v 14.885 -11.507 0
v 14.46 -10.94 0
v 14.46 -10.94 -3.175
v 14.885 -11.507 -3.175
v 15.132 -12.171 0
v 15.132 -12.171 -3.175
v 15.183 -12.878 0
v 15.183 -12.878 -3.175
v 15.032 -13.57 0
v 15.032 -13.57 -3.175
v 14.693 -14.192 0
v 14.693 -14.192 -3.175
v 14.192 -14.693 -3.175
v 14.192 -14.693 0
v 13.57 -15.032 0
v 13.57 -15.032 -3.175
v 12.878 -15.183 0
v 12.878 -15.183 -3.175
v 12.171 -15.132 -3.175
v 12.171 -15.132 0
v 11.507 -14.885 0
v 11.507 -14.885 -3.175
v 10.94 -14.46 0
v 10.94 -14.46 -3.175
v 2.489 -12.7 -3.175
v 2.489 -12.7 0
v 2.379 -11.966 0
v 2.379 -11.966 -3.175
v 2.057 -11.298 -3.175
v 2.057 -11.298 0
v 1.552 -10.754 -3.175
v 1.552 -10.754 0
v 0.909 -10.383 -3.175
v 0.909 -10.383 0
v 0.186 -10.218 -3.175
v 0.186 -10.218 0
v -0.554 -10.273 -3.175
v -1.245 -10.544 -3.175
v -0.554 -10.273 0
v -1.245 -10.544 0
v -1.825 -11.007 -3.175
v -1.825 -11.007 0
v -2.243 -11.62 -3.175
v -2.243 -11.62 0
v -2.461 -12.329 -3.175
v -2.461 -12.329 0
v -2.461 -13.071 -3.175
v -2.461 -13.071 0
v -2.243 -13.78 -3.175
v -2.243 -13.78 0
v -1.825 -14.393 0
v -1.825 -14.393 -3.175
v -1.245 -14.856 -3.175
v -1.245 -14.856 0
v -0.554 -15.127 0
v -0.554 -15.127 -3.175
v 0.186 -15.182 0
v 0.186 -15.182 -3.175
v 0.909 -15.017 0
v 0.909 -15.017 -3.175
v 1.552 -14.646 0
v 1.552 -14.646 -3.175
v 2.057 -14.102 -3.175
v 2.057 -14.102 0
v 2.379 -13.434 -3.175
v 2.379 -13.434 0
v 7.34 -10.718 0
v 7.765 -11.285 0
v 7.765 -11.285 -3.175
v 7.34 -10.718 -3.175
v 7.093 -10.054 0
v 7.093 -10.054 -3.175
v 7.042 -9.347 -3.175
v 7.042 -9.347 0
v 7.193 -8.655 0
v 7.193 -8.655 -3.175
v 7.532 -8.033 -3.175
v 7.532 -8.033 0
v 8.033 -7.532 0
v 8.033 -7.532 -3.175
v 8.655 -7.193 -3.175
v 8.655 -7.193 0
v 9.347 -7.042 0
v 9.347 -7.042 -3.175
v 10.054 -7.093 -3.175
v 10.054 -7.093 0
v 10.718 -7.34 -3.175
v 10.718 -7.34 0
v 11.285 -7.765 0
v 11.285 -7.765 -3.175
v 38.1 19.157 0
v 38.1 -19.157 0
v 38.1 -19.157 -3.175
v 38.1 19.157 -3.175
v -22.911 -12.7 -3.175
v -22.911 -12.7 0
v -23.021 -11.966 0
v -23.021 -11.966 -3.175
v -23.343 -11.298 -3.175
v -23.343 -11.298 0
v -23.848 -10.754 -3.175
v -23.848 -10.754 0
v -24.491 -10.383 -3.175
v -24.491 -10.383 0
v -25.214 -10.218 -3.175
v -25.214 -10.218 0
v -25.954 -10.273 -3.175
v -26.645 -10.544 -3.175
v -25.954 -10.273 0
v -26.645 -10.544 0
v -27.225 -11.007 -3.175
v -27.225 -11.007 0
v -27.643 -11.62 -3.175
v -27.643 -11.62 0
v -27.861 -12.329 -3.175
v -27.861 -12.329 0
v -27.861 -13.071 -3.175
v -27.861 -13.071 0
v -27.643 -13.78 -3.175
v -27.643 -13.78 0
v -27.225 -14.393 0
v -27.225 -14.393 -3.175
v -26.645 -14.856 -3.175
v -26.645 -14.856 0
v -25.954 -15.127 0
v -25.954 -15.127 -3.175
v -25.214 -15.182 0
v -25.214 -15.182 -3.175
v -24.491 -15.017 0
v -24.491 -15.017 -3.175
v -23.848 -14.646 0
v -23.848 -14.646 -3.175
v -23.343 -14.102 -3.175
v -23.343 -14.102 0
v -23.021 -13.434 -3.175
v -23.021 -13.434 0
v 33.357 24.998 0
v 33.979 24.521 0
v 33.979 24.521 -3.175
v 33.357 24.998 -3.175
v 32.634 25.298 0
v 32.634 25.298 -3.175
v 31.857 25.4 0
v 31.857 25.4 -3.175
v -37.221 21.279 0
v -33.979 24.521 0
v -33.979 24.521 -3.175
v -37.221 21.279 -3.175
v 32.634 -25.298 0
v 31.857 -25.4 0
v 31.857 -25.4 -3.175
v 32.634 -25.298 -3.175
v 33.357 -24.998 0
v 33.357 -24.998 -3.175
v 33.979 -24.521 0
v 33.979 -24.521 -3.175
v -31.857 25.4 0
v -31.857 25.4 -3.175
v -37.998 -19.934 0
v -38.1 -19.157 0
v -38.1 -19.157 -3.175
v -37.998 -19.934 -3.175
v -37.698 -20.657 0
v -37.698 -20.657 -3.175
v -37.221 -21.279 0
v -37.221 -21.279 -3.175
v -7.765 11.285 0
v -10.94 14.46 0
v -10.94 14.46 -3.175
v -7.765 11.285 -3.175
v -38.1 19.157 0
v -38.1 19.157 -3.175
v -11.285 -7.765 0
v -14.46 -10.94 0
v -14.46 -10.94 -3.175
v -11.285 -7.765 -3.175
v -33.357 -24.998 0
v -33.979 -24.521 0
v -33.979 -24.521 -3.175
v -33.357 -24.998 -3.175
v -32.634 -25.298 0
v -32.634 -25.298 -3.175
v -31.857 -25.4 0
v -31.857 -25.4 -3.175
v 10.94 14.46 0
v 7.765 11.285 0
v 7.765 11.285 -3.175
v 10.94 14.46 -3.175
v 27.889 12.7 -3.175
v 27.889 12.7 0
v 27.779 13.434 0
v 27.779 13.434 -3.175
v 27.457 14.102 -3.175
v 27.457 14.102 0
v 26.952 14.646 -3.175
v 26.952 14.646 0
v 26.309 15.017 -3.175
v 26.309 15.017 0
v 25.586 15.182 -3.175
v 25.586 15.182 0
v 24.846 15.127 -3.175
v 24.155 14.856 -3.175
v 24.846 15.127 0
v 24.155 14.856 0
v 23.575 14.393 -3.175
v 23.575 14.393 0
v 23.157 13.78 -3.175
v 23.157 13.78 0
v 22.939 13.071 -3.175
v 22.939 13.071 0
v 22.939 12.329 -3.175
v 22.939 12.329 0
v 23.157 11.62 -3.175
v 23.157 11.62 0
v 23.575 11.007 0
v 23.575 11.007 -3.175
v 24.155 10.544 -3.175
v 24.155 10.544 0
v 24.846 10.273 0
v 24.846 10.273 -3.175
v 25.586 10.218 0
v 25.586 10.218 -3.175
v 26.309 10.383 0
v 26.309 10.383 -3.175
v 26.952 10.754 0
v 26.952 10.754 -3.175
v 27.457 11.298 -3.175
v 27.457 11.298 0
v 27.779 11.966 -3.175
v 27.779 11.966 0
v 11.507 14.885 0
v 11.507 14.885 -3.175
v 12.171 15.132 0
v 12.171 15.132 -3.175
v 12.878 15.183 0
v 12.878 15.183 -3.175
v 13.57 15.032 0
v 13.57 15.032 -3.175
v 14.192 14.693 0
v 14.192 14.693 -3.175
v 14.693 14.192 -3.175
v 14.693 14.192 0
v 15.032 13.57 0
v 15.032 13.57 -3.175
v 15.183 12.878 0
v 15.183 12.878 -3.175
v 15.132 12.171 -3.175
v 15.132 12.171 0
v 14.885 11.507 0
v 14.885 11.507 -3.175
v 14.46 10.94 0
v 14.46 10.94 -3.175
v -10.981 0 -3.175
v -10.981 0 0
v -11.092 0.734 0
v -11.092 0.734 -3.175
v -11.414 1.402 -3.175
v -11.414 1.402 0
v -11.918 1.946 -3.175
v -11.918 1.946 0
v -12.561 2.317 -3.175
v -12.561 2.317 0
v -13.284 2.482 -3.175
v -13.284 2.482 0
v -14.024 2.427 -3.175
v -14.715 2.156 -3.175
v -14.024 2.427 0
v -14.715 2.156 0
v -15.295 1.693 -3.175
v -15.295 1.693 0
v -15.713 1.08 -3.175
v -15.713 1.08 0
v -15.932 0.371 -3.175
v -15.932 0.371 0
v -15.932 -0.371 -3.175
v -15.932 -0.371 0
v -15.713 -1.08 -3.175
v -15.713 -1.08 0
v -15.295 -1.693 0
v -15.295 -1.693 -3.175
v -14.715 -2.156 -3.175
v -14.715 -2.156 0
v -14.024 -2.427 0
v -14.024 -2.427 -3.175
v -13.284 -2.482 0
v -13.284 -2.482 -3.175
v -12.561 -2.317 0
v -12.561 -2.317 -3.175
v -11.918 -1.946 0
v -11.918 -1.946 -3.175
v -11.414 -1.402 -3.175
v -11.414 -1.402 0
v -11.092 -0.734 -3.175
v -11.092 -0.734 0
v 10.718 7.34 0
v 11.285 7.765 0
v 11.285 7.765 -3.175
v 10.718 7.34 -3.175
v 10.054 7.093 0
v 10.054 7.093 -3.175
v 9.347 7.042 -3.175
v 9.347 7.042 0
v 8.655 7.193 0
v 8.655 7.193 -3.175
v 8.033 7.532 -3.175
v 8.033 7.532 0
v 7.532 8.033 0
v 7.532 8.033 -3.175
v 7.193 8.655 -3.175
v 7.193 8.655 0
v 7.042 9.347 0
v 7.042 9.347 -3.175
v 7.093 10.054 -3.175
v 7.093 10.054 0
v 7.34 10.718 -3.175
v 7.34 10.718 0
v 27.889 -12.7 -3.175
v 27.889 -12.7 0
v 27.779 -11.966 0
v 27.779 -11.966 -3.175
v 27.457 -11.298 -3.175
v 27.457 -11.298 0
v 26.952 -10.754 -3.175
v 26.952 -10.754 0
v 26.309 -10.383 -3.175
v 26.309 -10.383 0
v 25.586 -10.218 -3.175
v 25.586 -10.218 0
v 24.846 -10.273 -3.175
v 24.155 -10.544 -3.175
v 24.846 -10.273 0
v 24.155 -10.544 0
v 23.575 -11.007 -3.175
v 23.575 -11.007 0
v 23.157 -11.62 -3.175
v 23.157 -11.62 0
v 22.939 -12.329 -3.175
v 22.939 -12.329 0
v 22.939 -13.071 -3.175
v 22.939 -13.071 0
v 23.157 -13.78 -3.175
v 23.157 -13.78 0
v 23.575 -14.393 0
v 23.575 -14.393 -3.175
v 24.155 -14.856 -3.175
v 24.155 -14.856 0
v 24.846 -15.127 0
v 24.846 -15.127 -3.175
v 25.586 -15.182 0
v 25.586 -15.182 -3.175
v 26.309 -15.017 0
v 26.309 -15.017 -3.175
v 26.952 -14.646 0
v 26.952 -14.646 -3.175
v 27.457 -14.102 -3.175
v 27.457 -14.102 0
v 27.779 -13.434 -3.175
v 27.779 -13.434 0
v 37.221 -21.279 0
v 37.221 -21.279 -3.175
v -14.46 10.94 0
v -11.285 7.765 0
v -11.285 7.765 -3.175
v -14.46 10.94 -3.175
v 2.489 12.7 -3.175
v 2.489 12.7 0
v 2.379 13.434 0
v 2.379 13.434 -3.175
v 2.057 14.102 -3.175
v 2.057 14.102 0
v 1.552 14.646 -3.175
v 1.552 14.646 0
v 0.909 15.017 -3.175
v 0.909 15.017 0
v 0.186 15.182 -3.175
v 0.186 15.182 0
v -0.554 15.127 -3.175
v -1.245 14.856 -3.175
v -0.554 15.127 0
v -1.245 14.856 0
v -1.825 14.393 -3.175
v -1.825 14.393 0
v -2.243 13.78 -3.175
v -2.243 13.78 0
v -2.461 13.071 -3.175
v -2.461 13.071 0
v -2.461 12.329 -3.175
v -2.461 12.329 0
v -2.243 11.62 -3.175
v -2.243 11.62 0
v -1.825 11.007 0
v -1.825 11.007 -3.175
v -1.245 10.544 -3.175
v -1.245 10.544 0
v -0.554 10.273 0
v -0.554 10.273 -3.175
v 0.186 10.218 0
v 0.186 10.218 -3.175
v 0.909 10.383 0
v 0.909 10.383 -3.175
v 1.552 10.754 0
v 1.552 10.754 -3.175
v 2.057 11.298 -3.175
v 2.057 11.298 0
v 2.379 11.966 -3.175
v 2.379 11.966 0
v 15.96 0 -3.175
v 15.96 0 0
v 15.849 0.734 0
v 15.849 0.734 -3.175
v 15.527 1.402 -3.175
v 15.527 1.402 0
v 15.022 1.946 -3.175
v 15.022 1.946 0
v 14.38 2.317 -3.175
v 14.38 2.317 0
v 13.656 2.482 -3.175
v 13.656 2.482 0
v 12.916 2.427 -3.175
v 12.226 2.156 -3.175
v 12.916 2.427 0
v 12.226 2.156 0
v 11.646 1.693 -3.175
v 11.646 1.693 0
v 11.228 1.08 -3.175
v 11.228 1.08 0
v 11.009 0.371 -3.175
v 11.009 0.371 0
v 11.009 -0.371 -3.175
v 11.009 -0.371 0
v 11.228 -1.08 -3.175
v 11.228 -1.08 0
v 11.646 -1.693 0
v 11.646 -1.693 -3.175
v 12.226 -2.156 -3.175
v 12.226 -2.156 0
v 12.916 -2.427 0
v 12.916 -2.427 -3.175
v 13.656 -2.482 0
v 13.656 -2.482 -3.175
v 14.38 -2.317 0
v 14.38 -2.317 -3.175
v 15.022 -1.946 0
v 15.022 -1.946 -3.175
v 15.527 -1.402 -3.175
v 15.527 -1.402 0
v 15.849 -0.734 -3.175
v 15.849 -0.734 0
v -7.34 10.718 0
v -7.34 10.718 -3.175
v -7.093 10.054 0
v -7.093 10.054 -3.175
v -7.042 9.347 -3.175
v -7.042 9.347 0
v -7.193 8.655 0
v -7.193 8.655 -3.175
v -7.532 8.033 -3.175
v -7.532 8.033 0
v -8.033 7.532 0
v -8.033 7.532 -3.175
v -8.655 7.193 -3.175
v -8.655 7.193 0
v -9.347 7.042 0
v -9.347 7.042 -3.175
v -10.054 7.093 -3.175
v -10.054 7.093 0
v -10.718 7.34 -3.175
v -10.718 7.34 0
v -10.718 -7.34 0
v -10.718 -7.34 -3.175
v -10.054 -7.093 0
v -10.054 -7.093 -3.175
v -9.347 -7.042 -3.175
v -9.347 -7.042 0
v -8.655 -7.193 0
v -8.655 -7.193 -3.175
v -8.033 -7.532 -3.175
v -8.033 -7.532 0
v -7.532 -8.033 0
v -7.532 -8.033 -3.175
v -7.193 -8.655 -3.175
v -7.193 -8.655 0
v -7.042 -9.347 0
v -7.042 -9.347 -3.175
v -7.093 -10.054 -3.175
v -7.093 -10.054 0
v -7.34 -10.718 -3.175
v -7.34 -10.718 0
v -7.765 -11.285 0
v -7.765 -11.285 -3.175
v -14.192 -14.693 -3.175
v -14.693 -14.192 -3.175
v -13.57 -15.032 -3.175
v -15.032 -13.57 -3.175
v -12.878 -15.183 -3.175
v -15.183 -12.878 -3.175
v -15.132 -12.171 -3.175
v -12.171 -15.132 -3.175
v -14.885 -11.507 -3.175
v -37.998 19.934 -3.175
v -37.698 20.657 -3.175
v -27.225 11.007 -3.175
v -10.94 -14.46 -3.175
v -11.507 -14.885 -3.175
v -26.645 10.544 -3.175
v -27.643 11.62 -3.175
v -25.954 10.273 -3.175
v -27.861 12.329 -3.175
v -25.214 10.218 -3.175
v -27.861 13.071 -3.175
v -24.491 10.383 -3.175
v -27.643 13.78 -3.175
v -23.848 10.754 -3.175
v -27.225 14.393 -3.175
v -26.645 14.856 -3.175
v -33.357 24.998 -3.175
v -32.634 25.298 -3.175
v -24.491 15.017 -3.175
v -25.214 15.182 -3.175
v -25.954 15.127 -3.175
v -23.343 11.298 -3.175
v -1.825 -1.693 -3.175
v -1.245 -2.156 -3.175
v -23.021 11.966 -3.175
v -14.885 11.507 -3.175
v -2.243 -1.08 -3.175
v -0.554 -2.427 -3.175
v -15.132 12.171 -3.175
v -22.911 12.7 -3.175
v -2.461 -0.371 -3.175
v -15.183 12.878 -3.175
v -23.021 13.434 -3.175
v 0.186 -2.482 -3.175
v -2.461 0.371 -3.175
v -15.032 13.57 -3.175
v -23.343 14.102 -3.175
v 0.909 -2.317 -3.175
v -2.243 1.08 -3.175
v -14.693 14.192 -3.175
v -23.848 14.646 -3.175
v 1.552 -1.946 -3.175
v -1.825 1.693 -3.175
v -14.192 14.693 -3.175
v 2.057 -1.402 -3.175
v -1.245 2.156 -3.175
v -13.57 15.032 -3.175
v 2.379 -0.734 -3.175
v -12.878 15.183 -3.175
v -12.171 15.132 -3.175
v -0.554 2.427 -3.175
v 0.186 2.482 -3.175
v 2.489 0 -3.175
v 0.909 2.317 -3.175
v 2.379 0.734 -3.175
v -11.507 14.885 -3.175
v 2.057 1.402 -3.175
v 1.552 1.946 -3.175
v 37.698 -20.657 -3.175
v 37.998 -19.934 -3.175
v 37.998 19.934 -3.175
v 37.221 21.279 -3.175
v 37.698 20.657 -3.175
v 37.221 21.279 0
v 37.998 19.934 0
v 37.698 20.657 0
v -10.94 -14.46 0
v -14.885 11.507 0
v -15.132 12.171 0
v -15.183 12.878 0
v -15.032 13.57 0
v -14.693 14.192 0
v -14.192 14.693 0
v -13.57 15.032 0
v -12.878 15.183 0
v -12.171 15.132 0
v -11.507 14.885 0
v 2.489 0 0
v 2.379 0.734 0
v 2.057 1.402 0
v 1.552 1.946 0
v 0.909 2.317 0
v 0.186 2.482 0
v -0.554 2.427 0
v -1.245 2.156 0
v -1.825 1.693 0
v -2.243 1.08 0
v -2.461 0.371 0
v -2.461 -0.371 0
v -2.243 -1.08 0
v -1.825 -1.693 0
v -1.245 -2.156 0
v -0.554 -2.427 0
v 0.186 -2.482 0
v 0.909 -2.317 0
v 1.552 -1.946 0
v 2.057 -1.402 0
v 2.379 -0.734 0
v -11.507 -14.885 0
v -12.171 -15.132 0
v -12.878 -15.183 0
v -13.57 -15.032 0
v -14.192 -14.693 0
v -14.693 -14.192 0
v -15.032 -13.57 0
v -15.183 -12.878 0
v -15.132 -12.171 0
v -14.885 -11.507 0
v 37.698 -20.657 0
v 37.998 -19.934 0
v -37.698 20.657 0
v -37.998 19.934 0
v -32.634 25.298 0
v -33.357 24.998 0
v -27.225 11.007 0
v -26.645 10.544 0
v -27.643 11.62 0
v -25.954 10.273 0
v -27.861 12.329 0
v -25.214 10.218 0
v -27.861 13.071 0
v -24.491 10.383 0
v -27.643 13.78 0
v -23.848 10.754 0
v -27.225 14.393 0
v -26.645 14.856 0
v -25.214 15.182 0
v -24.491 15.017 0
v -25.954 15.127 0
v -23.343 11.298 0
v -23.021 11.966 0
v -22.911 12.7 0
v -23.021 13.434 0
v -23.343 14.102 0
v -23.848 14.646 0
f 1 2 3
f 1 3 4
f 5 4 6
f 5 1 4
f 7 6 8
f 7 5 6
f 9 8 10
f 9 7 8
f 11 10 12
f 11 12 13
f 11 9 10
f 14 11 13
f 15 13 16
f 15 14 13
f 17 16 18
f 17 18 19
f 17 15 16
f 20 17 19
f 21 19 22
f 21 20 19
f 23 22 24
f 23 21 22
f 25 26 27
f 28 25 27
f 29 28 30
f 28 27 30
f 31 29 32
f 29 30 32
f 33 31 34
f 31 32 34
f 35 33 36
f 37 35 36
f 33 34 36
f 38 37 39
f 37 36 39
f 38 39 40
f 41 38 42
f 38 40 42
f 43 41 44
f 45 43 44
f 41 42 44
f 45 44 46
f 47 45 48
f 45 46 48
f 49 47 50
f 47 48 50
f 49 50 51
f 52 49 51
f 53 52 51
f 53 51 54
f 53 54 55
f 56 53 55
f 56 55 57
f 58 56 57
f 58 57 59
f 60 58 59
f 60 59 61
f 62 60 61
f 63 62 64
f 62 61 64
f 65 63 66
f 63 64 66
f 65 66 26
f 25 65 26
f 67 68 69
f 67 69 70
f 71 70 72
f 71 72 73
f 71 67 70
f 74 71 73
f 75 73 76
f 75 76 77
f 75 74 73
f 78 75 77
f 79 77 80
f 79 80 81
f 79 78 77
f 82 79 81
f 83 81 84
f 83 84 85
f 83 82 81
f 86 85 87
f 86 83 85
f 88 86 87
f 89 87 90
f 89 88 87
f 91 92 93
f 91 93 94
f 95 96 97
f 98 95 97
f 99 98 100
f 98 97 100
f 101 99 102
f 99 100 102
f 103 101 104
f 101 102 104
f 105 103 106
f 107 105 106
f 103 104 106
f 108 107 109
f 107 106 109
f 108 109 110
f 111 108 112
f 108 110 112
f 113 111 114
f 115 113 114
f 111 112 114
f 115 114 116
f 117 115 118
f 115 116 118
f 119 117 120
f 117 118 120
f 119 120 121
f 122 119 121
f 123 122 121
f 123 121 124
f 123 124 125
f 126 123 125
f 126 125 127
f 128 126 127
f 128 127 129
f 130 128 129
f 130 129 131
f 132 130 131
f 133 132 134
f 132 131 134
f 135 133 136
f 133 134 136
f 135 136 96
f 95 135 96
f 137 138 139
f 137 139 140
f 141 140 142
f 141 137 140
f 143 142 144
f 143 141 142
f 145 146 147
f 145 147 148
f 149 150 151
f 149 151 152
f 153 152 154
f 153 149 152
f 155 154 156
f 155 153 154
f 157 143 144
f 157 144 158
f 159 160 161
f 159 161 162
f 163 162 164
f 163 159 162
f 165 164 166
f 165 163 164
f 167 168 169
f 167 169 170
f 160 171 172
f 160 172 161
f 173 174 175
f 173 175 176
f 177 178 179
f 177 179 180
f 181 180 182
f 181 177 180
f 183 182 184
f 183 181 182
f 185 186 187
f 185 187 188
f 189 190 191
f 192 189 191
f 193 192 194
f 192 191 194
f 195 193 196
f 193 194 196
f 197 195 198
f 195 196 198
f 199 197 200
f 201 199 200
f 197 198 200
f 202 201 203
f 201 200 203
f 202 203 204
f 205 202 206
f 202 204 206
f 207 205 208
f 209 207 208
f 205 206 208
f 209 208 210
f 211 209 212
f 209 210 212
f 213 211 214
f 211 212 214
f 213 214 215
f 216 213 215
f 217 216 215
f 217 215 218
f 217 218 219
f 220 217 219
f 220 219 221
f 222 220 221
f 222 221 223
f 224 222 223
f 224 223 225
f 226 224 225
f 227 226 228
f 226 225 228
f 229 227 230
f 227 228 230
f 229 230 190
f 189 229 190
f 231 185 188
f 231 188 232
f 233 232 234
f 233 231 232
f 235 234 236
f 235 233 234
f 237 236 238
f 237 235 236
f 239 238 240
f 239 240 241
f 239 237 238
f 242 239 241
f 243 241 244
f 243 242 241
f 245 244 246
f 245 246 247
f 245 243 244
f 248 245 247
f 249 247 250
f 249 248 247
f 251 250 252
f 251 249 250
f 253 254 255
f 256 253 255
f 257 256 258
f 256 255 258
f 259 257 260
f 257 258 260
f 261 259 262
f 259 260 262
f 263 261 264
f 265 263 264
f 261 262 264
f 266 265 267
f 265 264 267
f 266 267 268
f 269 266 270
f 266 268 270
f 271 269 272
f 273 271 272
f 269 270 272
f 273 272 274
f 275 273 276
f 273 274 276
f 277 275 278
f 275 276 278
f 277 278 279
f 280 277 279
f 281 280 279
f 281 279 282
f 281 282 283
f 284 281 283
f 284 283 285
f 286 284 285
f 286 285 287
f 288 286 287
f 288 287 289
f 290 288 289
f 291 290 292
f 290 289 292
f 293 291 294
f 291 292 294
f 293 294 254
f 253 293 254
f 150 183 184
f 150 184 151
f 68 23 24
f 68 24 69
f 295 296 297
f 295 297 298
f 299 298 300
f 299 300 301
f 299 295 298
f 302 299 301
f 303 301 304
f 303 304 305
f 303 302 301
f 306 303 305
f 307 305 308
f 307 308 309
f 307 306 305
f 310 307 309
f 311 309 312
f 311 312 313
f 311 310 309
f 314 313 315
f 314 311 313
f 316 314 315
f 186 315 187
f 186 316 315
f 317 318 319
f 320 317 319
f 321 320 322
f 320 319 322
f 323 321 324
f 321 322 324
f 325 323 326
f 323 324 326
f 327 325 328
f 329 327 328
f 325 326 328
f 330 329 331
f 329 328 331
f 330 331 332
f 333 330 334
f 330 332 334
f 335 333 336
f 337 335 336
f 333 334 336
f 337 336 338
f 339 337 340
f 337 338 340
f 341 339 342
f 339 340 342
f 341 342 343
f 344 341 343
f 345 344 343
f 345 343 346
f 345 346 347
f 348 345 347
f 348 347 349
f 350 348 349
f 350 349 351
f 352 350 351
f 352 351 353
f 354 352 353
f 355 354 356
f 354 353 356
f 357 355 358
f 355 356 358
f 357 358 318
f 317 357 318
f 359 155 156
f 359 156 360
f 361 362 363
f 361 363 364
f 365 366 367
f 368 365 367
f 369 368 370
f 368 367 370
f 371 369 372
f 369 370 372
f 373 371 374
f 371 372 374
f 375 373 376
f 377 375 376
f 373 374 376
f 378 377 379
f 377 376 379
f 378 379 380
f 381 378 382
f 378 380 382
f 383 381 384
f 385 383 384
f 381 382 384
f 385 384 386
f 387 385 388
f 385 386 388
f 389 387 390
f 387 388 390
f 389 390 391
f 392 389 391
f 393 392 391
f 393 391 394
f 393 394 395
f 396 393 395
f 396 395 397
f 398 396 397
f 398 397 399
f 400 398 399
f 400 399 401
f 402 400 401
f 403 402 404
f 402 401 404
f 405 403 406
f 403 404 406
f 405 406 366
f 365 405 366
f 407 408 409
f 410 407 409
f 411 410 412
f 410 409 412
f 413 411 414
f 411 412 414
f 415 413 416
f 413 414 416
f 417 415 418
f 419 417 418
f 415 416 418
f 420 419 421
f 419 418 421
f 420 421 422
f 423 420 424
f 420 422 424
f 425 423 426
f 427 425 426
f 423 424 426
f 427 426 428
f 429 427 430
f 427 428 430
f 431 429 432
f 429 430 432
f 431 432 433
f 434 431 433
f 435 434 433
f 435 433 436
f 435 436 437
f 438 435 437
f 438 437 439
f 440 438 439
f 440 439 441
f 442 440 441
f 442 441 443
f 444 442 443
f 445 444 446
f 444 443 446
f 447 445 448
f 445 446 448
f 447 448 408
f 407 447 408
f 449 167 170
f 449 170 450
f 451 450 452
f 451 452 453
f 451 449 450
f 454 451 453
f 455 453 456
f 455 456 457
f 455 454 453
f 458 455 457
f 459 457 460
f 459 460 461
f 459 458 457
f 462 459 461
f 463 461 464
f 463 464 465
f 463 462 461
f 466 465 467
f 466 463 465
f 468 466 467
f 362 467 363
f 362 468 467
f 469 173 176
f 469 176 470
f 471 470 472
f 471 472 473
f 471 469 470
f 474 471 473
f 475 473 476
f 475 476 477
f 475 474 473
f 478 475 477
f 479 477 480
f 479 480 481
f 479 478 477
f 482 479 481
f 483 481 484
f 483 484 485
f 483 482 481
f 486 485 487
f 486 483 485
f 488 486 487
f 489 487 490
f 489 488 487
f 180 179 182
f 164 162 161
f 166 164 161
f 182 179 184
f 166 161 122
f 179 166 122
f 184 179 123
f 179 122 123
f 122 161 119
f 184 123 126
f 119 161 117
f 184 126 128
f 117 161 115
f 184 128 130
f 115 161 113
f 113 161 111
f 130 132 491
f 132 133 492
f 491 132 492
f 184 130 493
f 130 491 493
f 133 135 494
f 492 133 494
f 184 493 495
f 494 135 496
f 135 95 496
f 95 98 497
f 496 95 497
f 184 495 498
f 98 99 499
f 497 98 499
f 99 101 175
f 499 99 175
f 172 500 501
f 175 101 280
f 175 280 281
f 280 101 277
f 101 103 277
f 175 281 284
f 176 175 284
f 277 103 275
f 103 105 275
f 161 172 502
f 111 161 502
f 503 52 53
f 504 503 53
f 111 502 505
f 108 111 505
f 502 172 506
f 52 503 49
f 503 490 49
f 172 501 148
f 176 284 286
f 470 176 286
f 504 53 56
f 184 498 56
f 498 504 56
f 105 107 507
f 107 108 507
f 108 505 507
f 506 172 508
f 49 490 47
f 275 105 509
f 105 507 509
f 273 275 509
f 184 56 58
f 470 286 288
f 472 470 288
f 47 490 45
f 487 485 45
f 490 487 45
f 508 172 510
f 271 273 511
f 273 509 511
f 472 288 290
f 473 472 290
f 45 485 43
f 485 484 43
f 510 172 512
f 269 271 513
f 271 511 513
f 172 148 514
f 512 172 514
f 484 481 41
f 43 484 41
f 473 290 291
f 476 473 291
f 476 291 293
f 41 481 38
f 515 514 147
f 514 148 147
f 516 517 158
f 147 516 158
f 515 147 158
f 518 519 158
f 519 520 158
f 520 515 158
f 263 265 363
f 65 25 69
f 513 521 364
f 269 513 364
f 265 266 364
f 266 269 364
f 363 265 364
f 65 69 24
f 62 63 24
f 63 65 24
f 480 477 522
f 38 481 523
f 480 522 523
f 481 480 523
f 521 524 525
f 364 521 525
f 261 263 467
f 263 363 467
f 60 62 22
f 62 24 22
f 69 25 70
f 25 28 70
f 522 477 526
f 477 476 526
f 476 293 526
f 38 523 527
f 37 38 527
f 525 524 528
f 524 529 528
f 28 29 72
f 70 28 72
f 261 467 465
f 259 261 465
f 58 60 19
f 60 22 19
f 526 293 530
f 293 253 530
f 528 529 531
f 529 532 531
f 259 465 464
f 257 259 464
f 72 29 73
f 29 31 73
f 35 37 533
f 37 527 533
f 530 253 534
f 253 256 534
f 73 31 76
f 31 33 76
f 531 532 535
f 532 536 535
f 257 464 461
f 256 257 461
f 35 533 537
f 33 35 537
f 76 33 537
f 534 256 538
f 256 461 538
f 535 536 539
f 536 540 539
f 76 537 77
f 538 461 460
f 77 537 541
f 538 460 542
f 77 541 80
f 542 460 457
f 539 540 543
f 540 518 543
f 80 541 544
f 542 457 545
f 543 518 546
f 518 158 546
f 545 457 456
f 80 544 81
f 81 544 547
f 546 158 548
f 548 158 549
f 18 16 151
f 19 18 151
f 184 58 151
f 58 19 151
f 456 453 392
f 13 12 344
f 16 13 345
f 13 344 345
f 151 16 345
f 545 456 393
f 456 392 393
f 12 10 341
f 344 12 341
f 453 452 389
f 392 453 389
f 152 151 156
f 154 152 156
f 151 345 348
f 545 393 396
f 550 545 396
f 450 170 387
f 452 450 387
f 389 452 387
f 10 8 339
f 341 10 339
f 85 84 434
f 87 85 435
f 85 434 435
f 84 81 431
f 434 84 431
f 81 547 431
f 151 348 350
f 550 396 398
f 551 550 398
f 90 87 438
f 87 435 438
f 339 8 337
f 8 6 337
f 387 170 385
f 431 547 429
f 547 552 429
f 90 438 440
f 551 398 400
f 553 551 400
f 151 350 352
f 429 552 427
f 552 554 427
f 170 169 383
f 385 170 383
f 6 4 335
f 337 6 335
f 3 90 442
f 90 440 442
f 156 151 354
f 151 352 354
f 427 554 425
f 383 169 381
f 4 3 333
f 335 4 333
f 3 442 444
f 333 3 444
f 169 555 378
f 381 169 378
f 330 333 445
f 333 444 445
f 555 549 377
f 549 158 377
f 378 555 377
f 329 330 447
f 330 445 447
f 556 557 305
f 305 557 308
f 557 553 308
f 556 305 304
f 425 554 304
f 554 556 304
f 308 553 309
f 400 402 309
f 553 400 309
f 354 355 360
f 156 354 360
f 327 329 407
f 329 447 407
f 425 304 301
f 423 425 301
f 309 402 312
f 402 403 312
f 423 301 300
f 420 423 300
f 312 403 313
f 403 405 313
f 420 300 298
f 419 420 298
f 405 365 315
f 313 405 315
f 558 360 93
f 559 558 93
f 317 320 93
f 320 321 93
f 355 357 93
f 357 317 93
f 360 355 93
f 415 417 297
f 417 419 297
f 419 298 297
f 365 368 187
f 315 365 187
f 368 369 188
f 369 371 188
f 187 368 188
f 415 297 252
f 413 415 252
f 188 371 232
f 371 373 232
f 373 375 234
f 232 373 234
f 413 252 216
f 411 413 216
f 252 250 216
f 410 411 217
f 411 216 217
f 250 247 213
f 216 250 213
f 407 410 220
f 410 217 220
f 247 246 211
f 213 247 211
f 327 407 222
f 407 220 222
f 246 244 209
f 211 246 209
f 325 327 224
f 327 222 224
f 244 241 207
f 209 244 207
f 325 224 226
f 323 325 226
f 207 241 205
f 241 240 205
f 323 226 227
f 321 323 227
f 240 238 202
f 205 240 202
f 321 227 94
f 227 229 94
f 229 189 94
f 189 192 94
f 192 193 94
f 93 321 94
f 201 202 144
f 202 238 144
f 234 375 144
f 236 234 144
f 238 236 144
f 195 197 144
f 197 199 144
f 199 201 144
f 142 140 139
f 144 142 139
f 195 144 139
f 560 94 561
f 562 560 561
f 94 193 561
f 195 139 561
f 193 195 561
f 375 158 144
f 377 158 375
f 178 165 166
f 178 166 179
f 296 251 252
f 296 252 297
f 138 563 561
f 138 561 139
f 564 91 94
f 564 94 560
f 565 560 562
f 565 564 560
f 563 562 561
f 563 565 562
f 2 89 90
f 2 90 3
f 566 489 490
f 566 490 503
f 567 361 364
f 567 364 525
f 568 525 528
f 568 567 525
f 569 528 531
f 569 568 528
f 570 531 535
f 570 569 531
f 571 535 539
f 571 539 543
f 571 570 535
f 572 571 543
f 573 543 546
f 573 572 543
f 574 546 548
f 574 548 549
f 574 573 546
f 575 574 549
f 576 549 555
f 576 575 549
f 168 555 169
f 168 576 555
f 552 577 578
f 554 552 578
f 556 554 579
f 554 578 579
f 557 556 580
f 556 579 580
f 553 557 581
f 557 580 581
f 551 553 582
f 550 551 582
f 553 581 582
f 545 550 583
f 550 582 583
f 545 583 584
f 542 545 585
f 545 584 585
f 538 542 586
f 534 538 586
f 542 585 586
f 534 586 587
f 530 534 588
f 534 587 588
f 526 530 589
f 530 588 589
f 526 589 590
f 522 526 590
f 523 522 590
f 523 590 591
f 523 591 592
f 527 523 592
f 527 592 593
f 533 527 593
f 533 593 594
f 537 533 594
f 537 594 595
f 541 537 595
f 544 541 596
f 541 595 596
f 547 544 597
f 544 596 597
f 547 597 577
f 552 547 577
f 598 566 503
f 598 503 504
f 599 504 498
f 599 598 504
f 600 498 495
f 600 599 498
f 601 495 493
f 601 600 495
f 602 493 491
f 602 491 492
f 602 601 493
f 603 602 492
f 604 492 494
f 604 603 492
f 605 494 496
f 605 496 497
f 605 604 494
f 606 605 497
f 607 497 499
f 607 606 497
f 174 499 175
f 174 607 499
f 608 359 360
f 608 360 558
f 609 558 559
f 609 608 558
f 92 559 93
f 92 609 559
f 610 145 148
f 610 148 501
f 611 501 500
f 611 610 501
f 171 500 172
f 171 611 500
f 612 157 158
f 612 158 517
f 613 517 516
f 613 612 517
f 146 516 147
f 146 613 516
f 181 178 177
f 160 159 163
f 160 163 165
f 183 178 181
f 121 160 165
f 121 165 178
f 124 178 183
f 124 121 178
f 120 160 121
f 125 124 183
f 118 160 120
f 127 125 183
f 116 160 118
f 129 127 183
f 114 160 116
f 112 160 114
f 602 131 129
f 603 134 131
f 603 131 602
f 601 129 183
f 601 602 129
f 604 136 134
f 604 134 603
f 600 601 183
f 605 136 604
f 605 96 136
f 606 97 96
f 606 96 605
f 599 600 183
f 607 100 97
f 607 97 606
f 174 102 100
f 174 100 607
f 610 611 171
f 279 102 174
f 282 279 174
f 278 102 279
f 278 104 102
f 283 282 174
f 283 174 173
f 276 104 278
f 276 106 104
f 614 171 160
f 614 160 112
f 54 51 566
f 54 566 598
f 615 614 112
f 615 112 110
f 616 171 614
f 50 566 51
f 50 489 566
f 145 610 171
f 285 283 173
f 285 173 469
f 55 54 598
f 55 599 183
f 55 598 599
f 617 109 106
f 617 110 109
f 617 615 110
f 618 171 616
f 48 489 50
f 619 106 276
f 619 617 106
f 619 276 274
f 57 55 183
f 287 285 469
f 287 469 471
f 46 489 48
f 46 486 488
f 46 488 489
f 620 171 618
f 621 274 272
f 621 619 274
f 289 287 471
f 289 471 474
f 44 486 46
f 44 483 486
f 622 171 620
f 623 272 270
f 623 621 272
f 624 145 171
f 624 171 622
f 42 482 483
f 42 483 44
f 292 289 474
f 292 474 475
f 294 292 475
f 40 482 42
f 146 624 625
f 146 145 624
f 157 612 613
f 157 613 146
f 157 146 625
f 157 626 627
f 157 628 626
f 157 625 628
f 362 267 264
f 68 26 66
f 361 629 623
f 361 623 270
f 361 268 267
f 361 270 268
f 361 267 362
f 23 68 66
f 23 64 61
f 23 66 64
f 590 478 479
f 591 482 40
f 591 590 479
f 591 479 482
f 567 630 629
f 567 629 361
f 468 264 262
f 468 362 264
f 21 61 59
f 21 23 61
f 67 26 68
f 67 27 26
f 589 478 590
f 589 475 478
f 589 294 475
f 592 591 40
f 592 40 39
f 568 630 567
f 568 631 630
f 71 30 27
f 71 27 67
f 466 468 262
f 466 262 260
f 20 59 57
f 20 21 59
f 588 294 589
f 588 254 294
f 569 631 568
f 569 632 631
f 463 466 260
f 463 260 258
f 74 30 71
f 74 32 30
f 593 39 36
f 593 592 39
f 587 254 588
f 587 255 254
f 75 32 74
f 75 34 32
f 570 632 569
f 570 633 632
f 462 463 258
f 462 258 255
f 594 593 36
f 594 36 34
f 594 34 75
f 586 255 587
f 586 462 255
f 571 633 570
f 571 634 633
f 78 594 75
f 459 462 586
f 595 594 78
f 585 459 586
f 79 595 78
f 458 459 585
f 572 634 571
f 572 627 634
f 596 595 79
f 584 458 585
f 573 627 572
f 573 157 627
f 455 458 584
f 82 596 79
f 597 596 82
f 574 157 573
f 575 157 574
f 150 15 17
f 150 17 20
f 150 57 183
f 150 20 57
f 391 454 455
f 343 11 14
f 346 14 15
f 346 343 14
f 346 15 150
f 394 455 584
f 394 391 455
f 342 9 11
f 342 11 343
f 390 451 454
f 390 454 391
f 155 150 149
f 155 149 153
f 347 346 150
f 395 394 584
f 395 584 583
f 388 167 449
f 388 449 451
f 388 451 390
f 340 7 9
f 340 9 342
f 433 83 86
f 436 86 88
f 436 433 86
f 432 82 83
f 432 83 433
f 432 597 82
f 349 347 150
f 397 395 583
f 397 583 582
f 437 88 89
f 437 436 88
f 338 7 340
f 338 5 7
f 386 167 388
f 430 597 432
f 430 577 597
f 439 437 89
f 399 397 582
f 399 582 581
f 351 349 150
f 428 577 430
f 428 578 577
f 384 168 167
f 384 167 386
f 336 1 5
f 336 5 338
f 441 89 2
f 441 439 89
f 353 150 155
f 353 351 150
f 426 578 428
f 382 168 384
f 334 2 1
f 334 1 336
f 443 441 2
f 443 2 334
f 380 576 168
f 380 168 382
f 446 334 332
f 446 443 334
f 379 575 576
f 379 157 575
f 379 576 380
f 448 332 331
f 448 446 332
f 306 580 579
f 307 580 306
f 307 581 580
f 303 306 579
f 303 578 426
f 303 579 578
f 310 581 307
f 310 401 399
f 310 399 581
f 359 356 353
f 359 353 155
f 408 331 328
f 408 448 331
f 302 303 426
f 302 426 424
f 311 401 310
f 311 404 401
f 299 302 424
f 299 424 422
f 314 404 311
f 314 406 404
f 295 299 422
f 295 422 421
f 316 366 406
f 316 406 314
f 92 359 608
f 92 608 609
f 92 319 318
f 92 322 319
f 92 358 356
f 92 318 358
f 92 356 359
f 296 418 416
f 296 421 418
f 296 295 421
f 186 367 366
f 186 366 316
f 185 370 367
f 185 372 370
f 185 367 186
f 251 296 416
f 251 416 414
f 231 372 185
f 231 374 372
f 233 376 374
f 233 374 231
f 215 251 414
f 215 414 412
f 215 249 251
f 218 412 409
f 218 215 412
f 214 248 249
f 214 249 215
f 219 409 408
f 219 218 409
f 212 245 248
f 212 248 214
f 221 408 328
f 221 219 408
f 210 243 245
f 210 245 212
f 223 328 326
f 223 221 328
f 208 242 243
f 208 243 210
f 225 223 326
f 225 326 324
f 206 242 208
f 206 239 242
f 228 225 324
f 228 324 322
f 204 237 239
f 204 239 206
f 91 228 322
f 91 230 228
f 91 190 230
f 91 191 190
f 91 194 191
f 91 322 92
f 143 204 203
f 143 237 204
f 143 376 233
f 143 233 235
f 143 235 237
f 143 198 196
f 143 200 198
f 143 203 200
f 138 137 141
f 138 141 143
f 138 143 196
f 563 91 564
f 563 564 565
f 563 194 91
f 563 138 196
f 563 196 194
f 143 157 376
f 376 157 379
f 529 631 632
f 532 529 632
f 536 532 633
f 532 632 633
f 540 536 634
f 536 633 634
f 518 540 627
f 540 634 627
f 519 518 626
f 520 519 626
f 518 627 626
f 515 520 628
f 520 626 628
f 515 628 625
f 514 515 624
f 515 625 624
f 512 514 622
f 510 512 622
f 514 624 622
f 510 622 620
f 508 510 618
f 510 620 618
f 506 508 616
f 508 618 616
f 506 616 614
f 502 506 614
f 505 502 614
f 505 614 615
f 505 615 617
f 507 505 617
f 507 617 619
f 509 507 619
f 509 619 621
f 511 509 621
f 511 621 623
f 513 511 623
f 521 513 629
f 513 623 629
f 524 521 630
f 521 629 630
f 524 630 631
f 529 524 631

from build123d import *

# Parameters (mm, degrees)
SKETCH1_R           = 2.4892
BOSS_EXTRUDE1_DEPTH = 3.175


with BuildPart() as part:
    # Sketch1 → Boss-Extrude1 (new body)
    with BuildSketch(Plane.XY):
        with BuildLine():
            Line((33.978679656, -24.521320344), (37.221320344, -21.278679656))
            ThreePointArc((37.221320344, -21.278679656), (37.871638598, -20.30540961), (38.1, -19.157359313))
            Line((38.1, -19.157359313), (38.1, 19.157359313))
            ThreePointArc((38.1, 19.157359313), (37.871638598, 20.30540961), (37.221320344, 21.278679656))
            Line((37.221320344, 21.278679656), (33.978679656, 24.521320344))
            ThreePointArc((33.978679656, 24.521320344), (33.00540961, 25.171638598), (31.857359313, 25.4))
            Line((31.857359313, 25.4), (-31.857359313, 25.4))
            ThreePointArc((-31.857359313, 25.4), (-33.00540961, 25.171638598), (-33.978679656, 24.521320344))
            Line((-33.978679656, 24.521320344), (-37.221320344, 21.278679656))
            ThreePointArc((-37.221320344, 21.278679656), (-37.871638598, 20.30540961), (-38.1, 19.157359313))
            Line((-38.1, 19.157359313), (-38.1, -19.157359313))
            ThreePointArc((-38.1, -19.157359313), (-37.871638598, -20.30540961), (-37.221320344, -21.278679656))
            Line((-37.221320344, -21.278679656), (-33.978679656, -24.521320344))
            ThreePointArc((-33.978679656, -24.521320344), (-33.00540961, -25.171638598), (-31.857359313, -25.4))
            Line((-31.857359313, -25.4), (31.857359313, -25.4))
            ThreePointArc((31.857359313, -25.4), (33.00540961, -25.171638598), (33.978679656, -24.521320344))
        make_face()
        with Locations((13.470384182, 0)):
            Circle(SKETCH1_R, mode=Mode.SUBTRACT)
        with Locations((-25.4, 12.7)):
            Circle(SKETCH1_R, mode=Mode.SUBTRACT)
        with Locations((25.4, 12.7)):
            Circle(SKETCH1_R, mode=Mode.SUBTRACT)
        with Locations((25.4, -12.7)):
            Circle(SKETCH1_R, mode=Mode.SUBTRACT)
        with Locations((0, -12.7)):
            Circle(SKETCH1_R, mode=Mode.SUBTRACT)
        with Locations((-25.4, -12.7)):
            Circle(SKETCH1_R, mode=Mode.SUBTRACT)
        with Locations((0, 12.7)):
            Circle(SKETCH1_R, mode=Mode.SUBTRACT)
        Circle(SKETCH1_R, mode=Mode.SUBTRACT)
        with Locations((-13.470384182, 0)):
            Circle(SKETCH1_R, mode=Mode.SUBTRACT)
        with BuildLine():
            Line((11.2851302, -7.7648698), (14.4601302, -10.9398698))
            ThreePointArc((14.4601302, -10.9398698), (14.4601302, -14.4601302), (10.9398698, -14.4601302))
            Line((10.9398698, -14.4601302), (7.7648698, -11.2851302))
            ThreePointArc((7.7648698, -11.2851302), (7.7648698, -7.7648698), (11.2851302, -7.7648698))
        make_face(mode=Mode.SUBTRACT)
        with BuildLine():
            Line((-10.9398698, 14.4601302), (-7.7648698, 11.2851302))
            ThreePointArc((-7.7648698, 11.2851302), (-7.7648698, 7.7648698), (-11.2851302, 7.7648698))
            Line((-11.2851302, 7.7648698), (-14.4601302, 10.9398698))
            ThreePointArc((-14.4601302, 10.9398698), (-14.4601302, 14.4601302), (-10.9398698, 14.4601302))
        make_face(mode=Mode.SUBTRACT)
        with BuildLine():
            Line((-7.7648698, -11.2851302), (-10.9398698, -14.4601302))
            ThreePointArc((-10.9398698, -14.4601302), (-14.4601302, -14.4601302), (-14.4601302, -10.9398698))
            Line((-14.4601302, -10.9398698), (-11.2851302, -7.7648698))
            ThreePointArc((-11.2851302, -7.7648698), (-7.7648698, -7.7648698), (-7.7648698, -11.2851302))
        make_face(mode=Mode.SUBTRACT)
        with BuildLine():
            Line((14.4601302, 10.9398698), (11.2851302, 7.7648698))
            ThreePointArc((11.2851302, 7.7648698), (7.7648698, 7.7648698), (7.7648698, 11.2851302))
            Line((7.7648698, 11.2851302), (10.9398698, 14.4601302))
            ThreePointArc((10.9398698, 14.4601302), (14.4601302, 14.4601302), (14.4601302, 10.9398698))
        make_face(mode=Mode.SUBTRACT)
    extrude(amount=-BOSS_EXTRUDE1_DEPTH)


solid = part.part
